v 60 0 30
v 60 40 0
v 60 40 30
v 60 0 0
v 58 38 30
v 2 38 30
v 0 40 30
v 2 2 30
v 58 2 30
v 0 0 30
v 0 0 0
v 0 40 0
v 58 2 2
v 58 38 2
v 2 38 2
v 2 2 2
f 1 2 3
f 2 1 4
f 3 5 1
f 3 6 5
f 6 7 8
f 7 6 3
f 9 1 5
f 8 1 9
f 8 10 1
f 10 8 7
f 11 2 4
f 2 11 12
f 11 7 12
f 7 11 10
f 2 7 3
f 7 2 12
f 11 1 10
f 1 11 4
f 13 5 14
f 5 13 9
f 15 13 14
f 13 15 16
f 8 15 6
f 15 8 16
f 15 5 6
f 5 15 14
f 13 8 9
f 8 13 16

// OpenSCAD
// Parametric box
length = 60;
width = 40;
height = 30;
wall = 2;

difference() {
    cube([length, width, height]);
    translate([wall, wall, wall])
        cube([length - 2*wall, width - 2*wall, height - wall]);
}
